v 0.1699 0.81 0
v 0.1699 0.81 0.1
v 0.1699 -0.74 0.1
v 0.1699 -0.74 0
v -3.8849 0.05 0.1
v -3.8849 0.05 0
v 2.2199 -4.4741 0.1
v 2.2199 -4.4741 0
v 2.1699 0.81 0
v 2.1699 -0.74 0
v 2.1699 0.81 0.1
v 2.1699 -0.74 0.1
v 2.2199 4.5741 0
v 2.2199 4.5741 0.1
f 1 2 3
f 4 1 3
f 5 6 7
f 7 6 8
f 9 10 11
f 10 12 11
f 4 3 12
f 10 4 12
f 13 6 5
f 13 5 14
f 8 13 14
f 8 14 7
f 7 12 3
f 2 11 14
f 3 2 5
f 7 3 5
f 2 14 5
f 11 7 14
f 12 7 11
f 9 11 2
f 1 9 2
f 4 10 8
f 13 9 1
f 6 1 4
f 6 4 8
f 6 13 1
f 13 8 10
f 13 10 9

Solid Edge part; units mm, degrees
sketch "Sketch1" plane through (0, 0, 0) normal (0, 0, 1) x (1, 0, 0)
  line L0 (-3.8849, 0.05) -> (2.2199, 4.5741)
  line L1 (2.2199, 4.5741) -> (2.2199, -4.4741)
  line L2 (-3.8849, 0.05) -> (2.2199, -4.4741)
extrude "Protrusion1" add sketch "Sketch1" along normal blind 0.1
sketch "Sketch2" plane through (-0.8325, 0.05, 0.1) normal (0, 0, 1) x (0, 1, 0)
  line L0 (-0.79, -3.0024) -> (0.76, -3.0024)
  line L1 (0.76, -3.0024) -> (0.76, -1.0024)
  line L2 (0.76, -1.0024) -> (-0.79, -1.0024)
  line L3 (-0.79, -1.0024) -> (-0.79, -3.0024)
  dimension "D1" = 1.55
  dimension "D2" = 0.05
  dimension "D3" = 0.74
  dimension "D4" = 2
extrude "Cutout1" cut sketch "Sketch2" against normal through all
